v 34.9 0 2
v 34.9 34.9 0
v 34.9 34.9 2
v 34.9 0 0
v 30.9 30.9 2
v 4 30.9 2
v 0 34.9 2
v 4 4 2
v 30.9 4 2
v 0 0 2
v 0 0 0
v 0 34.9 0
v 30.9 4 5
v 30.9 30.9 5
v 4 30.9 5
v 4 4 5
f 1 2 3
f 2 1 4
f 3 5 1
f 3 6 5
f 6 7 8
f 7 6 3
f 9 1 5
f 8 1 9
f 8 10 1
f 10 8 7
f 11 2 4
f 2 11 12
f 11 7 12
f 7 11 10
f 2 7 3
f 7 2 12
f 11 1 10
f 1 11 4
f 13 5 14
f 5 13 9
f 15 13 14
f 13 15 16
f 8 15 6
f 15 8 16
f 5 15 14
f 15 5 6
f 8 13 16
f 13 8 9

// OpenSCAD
// Copyright 2018 Marcos Del Sol Vives
// SPDX-License-Identifier: ISC

// Tweak these parameters to your hearth's content

// Hole width. Slightly less than led_length minus twice wall_thickness.
hole_width = 33 - 2 * 3 - 0.1;

// Hole length. For this, actually the same as the width.
hole_length = hole_width;

// Hole height. This is the height of the tab that fits in the hole.
hole_height = 3;

// Size of the tabs around the cover, to prevent the cover from going in.
tab_size = 4;

// Height of the tabs.
tab_height = 2;

// END OF CONFIGURATION

cube([hole_width + 2 * tab_size, hole_length + 2 * tab_size, tab_height]);
translate([tab_size, tab_size, tab_height])
    cube([hole_width, hole_length, hole_height]);
